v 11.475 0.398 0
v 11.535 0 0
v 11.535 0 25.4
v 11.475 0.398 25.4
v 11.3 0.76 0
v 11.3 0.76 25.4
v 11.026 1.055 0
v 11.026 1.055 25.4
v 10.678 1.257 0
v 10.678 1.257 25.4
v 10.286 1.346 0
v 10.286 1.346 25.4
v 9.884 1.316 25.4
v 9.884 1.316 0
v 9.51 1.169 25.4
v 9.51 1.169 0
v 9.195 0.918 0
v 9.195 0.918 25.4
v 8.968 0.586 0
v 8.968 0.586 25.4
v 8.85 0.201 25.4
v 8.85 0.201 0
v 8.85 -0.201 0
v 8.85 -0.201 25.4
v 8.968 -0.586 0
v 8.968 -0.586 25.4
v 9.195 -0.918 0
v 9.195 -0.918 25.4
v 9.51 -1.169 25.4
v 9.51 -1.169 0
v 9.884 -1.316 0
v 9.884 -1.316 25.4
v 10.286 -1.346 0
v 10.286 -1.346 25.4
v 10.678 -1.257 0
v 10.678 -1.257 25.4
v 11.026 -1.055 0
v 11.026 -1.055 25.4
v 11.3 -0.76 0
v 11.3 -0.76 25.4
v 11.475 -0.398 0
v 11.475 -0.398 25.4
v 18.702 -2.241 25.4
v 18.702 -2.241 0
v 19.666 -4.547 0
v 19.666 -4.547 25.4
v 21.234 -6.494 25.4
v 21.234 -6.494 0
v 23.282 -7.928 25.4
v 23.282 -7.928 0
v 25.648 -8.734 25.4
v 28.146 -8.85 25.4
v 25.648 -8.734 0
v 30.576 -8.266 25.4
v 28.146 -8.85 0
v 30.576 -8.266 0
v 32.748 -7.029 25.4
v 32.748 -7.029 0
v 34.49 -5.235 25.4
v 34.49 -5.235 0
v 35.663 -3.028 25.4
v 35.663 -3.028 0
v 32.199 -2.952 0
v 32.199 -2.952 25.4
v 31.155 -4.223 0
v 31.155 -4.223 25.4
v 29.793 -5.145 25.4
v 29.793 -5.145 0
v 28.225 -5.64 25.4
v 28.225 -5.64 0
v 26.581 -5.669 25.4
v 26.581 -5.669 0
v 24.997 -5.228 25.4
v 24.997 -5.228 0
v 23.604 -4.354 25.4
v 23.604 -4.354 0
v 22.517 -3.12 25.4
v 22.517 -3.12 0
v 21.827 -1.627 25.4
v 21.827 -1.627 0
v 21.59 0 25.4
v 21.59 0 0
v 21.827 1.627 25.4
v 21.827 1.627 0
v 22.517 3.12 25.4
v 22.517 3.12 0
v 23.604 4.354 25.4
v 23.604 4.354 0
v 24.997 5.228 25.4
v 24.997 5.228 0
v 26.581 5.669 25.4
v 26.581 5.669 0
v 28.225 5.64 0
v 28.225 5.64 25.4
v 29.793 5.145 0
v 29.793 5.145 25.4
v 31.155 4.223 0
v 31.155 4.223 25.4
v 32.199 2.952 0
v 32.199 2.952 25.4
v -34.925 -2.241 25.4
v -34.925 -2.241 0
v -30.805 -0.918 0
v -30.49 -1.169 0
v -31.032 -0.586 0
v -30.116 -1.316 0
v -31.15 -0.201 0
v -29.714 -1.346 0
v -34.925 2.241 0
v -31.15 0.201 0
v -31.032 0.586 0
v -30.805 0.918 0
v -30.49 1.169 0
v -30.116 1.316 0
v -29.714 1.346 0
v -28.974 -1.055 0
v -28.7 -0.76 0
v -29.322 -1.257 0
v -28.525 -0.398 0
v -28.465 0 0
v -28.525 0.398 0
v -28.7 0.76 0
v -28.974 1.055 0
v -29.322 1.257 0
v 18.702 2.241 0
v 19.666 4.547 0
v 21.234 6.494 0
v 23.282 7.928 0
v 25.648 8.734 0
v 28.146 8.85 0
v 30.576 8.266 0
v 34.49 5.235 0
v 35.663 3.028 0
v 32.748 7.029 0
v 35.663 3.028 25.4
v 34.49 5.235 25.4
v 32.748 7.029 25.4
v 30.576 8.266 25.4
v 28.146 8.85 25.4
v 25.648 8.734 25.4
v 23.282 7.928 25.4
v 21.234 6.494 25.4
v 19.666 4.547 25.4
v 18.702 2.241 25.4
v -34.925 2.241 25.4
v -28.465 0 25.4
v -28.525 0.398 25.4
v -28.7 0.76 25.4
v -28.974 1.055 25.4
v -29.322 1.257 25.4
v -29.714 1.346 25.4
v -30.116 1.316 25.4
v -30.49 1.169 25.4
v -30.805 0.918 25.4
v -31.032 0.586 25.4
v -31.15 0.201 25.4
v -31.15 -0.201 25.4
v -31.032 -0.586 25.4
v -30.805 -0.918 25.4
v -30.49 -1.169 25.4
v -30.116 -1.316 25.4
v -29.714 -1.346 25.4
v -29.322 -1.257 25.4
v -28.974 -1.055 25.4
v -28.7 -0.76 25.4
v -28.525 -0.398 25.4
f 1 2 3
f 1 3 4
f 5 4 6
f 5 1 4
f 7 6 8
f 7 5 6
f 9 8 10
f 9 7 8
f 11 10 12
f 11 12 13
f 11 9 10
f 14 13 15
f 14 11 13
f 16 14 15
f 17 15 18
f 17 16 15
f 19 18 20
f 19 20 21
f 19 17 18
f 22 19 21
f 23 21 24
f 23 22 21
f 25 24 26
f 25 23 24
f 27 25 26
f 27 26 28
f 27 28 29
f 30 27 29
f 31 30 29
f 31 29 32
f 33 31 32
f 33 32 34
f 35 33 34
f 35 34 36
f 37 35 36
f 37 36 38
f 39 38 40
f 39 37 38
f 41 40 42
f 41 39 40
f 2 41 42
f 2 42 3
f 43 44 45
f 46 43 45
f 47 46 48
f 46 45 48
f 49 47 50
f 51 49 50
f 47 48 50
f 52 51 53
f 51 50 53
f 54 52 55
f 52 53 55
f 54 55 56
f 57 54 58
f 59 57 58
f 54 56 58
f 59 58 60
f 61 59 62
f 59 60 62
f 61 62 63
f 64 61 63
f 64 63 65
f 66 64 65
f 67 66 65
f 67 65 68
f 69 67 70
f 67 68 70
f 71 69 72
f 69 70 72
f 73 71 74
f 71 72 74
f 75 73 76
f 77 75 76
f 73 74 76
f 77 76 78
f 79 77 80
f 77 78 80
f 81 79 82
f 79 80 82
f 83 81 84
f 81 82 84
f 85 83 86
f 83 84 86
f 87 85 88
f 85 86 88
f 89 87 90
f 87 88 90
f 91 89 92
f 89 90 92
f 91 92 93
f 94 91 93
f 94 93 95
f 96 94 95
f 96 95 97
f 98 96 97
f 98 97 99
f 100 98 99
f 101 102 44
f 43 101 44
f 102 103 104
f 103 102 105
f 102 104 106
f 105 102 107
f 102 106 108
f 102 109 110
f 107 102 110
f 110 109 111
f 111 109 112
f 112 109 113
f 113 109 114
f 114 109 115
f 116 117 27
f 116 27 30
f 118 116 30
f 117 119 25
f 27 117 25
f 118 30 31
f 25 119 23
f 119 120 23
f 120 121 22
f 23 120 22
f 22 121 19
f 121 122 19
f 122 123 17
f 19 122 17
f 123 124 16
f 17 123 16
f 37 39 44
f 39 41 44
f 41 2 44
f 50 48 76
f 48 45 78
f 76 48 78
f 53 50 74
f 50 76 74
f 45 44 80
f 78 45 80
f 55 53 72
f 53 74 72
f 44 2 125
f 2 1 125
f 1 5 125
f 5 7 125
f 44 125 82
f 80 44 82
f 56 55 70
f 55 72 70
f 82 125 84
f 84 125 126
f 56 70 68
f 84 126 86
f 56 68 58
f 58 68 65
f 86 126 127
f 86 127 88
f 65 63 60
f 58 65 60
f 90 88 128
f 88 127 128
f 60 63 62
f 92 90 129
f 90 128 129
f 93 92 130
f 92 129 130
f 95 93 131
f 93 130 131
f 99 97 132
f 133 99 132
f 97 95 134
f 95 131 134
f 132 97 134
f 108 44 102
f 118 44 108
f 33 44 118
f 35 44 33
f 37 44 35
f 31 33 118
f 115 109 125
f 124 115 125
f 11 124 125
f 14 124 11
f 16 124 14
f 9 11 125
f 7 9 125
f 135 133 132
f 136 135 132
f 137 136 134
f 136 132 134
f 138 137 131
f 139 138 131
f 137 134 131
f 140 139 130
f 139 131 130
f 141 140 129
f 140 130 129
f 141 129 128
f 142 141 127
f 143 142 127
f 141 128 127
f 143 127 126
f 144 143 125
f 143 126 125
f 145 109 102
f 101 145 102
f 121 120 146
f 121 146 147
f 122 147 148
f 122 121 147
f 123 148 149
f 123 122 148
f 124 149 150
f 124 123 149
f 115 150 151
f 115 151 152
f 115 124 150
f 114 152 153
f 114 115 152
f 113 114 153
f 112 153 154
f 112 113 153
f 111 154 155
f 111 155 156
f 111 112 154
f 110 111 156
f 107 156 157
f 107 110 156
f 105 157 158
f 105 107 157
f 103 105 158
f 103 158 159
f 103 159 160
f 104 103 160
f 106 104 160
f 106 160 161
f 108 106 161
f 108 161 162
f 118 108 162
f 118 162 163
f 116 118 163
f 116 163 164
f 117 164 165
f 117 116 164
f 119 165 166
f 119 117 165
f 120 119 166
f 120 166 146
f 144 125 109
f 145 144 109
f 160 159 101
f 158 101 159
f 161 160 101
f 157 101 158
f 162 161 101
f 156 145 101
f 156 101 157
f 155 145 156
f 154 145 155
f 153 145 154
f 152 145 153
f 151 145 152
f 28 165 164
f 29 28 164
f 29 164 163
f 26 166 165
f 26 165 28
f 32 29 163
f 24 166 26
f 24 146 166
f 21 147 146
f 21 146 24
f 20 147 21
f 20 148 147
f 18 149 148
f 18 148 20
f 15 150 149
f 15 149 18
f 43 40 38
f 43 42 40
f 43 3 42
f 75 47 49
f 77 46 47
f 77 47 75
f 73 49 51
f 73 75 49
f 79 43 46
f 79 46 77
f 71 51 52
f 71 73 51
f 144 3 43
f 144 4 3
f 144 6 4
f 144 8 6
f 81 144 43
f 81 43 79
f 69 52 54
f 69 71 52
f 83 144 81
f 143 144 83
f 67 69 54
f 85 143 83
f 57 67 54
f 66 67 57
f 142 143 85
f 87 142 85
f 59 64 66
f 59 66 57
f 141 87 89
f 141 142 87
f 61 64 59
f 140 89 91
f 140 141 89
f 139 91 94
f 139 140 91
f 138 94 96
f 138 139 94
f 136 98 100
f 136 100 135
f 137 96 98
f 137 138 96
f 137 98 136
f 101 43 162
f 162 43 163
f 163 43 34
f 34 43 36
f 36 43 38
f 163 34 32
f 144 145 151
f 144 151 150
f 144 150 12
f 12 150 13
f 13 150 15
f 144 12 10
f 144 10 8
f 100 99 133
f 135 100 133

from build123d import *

# Parameters (mm, degrees)
F0_R     = 1.35
F1_DEPTH = 25.4


with BuildPart() as f1:
    # F0 (on Top) → F1 (new body)
    with BuildSketch(Plane.XY):
        with BuildLine():
            Line((-34.925, 2.240668), (-34.925, -2.240668))
            Line((-34.925, -2.240668), (18.702006, -2.240668))
            ThreePointArc((18.702006, -2.240668), (26.892817, -8.880439), (35.663454, -3.027929))
            Line((35.663454, -3.027929), (32.198582, -2.951963))
            ThreePointArc((32.198582, -2.951963), (21.59, 0), (32.198582, 2.951963))
            Line((32.198582, 2.951963), (35.663454, 3.027929))
            ThreePointArc((35.663454, 3.027929), (26.892817, 8.880439), (18.702006, 2.240668))
            Line((18.702006, 2.240668), (-34.925, 2.240668))
        make_face()
        with Locations((-29.815227, 0)):
            Circle(F0_R, mode=Mode.SUBTRACT)
        with Locations((10.184773, 0)):
            Circle(F0_R, mode=Mode.SUBTRACT)
    extrude(amount=F1_DEPTH)


solid = f1.part
